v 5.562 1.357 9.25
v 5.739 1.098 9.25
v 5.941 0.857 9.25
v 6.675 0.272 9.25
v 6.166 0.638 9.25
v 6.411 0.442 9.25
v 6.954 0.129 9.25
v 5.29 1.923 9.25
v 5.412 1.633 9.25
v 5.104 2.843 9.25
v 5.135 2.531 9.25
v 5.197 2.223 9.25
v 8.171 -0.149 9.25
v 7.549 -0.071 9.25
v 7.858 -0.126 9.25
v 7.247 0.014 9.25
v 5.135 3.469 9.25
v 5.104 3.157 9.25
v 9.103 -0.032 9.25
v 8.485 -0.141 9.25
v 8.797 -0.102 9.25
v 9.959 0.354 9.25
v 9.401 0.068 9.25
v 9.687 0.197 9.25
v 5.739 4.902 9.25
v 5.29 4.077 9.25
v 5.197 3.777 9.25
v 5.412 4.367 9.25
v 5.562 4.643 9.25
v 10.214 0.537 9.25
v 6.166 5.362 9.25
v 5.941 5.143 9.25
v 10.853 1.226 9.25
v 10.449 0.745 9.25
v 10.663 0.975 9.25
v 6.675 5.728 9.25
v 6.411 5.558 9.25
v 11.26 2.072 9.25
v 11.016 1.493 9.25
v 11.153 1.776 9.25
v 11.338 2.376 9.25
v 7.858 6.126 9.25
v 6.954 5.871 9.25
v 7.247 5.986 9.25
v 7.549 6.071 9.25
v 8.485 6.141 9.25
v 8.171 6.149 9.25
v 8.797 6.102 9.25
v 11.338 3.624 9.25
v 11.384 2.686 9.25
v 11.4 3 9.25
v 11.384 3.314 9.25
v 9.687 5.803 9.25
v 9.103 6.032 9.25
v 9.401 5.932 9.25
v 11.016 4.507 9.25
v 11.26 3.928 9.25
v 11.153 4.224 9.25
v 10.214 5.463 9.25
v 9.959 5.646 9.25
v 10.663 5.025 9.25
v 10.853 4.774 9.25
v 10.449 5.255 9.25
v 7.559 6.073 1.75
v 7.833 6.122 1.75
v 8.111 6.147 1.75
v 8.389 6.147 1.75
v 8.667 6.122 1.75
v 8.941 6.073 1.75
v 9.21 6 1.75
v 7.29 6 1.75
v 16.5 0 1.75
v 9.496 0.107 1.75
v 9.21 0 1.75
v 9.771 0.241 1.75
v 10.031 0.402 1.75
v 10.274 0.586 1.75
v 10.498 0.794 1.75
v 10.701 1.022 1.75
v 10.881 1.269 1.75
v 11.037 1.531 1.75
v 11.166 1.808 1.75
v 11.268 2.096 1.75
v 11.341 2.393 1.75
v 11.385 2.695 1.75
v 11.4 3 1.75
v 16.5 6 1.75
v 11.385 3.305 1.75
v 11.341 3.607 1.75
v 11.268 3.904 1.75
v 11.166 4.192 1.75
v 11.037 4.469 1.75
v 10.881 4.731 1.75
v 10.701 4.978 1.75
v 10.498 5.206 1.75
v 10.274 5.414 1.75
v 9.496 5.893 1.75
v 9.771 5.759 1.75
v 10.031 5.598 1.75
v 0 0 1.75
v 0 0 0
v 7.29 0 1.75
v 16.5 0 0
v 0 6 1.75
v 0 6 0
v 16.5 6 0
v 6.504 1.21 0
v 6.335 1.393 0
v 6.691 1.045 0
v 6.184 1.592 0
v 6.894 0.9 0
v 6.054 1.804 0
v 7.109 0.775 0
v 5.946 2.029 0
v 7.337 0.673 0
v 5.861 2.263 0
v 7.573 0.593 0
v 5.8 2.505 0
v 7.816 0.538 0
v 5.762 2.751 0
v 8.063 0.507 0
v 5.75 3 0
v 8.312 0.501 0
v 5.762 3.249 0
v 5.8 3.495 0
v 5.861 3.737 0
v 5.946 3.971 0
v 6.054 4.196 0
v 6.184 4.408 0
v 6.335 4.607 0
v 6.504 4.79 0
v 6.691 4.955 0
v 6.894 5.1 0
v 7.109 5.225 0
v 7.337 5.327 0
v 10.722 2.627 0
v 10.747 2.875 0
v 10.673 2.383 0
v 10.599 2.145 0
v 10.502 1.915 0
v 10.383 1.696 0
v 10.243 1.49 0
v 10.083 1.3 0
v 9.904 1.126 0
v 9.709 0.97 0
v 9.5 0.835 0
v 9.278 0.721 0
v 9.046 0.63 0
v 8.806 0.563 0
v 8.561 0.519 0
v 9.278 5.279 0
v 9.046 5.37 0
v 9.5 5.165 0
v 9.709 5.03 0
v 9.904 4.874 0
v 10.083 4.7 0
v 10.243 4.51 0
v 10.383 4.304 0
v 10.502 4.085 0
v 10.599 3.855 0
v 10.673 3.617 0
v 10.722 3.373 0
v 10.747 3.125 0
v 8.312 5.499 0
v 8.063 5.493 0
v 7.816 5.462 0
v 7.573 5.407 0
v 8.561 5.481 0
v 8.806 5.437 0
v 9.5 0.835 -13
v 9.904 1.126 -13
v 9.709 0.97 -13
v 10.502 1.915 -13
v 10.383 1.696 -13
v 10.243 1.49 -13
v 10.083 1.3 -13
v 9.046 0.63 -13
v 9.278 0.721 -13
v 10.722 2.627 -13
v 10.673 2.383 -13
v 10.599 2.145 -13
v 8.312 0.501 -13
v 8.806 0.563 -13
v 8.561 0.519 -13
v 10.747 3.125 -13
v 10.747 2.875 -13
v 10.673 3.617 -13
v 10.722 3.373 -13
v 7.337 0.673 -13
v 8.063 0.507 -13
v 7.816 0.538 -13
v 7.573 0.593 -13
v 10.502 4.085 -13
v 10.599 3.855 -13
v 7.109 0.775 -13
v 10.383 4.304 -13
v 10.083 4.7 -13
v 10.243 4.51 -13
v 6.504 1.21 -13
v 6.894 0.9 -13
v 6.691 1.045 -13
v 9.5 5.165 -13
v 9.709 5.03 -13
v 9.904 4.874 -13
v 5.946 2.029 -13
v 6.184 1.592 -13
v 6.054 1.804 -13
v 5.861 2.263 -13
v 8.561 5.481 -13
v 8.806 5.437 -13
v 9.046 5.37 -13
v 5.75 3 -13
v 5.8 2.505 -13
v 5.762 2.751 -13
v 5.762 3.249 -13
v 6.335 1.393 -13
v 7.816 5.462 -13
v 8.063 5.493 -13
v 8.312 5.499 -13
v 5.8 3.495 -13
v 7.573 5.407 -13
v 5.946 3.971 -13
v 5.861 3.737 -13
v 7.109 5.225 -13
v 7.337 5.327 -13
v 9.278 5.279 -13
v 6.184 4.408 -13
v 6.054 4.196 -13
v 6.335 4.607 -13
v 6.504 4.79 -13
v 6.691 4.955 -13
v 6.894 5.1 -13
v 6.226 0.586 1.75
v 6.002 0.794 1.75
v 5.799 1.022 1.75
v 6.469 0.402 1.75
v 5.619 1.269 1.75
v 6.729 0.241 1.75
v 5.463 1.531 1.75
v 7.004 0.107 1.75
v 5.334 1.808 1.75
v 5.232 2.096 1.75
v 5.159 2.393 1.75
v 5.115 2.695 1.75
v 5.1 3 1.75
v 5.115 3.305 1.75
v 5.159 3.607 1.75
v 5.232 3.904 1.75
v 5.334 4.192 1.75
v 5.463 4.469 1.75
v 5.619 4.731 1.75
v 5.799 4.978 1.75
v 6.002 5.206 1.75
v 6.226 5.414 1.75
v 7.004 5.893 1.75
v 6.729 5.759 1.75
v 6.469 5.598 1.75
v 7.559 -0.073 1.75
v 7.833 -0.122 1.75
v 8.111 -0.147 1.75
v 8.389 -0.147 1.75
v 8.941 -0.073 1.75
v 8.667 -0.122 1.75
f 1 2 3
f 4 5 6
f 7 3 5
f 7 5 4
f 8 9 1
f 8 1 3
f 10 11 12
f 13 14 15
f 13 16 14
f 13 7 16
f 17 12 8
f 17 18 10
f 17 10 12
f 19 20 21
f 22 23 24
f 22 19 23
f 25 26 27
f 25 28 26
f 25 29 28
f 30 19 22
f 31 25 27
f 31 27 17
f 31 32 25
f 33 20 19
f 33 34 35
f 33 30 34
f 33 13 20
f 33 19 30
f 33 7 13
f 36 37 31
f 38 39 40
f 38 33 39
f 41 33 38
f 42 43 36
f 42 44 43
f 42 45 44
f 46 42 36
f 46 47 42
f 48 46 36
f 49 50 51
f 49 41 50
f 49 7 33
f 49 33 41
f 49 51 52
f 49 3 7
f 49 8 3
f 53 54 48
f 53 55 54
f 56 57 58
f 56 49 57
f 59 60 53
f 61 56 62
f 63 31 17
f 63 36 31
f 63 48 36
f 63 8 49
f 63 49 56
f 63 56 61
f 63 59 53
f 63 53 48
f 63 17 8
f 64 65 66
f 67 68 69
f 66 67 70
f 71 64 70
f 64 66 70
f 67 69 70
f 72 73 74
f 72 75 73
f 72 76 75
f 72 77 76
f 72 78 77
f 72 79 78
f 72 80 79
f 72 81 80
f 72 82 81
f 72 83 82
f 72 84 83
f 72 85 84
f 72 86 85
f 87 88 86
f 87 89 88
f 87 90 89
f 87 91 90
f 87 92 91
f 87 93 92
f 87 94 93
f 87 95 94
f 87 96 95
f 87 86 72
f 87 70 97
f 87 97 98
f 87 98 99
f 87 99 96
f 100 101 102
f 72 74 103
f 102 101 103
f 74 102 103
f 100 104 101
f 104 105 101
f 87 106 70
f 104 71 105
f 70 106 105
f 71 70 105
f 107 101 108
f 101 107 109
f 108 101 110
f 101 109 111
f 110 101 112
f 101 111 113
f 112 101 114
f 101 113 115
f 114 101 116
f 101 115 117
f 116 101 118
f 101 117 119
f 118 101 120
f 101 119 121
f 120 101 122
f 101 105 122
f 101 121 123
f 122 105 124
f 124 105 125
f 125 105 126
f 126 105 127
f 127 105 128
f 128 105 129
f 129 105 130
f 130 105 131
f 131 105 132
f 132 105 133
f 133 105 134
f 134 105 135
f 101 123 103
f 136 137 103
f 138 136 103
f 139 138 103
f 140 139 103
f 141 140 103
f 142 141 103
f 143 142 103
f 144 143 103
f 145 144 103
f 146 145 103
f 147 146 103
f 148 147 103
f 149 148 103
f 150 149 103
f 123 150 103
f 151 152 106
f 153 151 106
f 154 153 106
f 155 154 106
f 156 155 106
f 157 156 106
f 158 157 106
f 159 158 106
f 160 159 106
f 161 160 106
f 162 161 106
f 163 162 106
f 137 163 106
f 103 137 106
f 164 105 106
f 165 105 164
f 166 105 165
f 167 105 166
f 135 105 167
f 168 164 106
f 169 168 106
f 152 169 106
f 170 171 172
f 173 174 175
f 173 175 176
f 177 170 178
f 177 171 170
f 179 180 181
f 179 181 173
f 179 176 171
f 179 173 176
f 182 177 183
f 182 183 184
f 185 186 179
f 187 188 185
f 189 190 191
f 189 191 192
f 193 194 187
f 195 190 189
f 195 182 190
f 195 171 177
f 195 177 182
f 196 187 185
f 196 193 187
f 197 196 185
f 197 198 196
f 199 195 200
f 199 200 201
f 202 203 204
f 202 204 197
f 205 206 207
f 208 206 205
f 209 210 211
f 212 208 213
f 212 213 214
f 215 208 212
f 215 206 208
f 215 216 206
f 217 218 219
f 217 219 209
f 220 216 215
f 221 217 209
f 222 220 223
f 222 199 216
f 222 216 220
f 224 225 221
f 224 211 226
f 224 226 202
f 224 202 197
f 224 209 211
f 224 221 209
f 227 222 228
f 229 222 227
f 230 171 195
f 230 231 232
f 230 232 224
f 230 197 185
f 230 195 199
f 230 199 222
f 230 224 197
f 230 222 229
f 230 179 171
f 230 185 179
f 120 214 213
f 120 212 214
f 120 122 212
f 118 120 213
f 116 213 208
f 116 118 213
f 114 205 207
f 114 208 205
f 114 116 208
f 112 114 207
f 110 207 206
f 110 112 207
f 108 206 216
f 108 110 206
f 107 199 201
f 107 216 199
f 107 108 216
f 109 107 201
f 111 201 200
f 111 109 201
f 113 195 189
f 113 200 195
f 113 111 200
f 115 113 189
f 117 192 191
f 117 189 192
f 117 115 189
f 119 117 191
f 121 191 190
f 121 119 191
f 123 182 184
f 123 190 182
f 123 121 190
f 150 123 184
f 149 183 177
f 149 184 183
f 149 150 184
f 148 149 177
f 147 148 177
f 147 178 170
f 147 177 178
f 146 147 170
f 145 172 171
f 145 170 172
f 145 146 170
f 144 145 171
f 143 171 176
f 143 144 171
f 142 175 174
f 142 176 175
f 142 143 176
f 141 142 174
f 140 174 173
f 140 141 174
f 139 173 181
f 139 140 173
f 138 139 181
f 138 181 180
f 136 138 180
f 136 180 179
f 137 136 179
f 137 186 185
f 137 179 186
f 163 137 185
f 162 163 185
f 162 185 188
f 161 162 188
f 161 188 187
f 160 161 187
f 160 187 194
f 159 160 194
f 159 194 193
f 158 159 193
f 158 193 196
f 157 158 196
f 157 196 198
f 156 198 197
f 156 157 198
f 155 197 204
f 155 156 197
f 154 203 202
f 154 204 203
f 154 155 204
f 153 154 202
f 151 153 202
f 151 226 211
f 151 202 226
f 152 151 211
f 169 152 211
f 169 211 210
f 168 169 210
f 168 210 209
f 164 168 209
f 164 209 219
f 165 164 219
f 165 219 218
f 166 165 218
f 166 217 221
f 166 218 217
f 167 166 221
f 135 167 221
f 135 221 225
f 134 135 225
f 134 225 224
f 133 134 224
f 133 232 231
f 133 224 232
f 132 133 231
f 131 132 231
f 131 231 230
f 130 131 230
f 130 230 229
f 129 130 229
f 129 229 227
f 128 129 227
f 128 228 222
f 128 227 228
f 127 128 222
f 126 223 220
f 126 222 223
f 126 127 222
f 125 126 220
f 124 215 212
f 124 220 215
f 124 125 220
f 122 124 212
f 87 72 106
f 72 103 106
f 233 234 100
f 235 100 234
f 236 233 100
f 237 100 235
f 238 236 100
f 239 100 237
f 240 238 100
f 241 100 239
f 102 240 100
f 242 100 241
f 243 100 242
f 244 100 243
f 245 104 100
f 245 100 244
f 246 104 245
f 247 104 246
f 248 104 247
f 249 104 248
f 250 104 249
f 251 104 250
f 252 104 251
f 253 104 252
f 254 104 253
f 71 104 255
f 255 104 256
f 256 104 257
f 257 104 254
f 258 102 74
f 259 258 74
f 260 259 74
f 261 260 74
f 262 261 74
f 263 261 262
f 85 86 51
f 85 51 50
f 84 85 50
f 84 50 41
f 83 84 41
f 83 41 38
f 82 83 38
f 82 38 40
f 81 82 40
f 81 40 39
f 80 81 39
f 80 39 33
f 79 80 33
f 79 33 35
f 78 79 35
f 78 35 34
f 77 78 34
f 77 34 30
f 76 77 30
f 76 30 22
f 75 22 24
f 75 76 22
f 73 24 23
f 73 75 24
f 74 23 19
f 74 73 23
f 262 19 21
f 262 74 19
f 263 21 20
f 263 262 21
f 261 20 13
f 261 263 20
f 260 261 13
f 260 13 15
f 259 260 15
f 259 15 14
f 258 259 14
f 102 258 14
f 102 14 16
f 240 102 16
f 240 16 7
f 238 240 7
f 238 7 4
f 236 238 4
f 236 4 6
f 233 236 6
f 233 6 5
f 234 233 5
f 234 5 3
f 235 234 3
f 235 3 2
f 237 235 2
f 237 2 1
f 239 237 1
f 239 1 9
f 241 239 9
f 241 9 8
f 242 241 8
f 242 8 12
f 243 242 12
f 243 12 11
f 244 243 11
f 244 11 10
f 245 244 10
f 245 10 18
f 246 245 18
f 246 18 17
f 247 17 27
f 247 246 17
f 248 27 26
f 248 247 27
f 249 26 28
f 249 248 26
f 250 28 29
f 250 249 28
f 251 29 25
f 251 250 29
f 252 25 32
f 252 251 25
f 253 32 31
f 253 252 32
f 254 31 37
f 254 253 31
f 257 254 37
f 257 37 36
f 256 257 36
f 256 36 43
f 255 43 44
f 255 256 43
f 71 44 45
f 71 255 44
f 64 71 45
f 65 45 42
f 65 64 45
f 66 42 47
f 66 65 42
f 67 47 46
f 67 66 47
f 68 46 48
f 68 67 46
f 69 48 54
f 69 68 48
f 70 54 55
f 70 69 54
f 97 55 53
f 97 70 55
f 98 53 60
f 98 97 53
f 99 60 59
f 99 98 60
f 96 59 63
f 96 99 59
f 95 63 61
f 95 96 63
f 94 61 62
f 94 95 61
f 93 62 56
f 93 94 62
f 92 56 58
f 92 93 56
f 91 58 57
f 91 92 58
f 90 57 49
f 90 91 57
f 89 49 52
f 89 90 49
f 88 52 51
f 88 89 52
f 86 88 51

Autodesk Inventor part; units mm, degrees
ref_plane "YZ Plane" through (0, 0, 0) normal (1, 0, 0) x (0, 1, 0)
ref_plane "XZ Plane" through (0, 0, 0) normal (0, 1, 0) x (-1, 0, 0)
ref_plane "XY Plane" through (0, 0, 0) normal (0, 0, 1) x (1, 0, 0)
sketch "Sketch1" plane through (0, 0, 0) normal (0, 0, 1) x (1, 0, 0)
  line L0 (0, 0) -> (35.3316, 0)
  line L1 (0, 0) -> (16.5, 0)
  line L2 (16.5, 0) -> (16.5, 6)
  line L3 (16.5, 6) -> (0, 6)
  line L4 (0, 6) -> (0, 0)
  dimension "d0" = 16.5
  dimension "d1" = 6
extrude "Extrusion1" add sketch "Sketch1" along normal blind 1.75
sketch "Sketch2" plane through (0, 0, 1.75) normal (0, 0, 1) x (1, 0, 0)
  line L0 (0, 0) -> (16.5, 0) projected
  line L1 (16.5, 0) -> (16.5, 6) projected
  line L2 (16.5, 6) -> (0, 6) projected
  line L3 (0, 6) -> (0, 0) projected
  line L4 (8.25, 6) -> (8.25, 0) construction
  circle A0 centre (8.25, 3) radius 3.15
  dimension "d4" = 6.3
extrude "Extrusion2" add sketch "Sketch2" along normal blind 7.5 contours A0 L2 L0 | L0 A0 | A0 L2
sketch "Sketch3" plane through (0, 0, 0) normal (0, 0, -1) x (-1, 0, 0)
  line L0 (0, 0) -> (-16.5, 0) projected
  line L1 (0, 6) -> (0, 0) projected
  line L2 (-16.5, 6) -> (0, 6) projected
  line L3 (-16.5, 0) -> (-16.5, 6) projected
  line L4 (-8.25, 6) -> (-8.25, 0) construction
  circle A0 centre (-8.25, 3) radius 2.5
  dimension "d7" = 5
extrude "Extrusion3" add sketch "Sketch3" along normal blind 13 contours A0
properties part number "SMA whip end"
